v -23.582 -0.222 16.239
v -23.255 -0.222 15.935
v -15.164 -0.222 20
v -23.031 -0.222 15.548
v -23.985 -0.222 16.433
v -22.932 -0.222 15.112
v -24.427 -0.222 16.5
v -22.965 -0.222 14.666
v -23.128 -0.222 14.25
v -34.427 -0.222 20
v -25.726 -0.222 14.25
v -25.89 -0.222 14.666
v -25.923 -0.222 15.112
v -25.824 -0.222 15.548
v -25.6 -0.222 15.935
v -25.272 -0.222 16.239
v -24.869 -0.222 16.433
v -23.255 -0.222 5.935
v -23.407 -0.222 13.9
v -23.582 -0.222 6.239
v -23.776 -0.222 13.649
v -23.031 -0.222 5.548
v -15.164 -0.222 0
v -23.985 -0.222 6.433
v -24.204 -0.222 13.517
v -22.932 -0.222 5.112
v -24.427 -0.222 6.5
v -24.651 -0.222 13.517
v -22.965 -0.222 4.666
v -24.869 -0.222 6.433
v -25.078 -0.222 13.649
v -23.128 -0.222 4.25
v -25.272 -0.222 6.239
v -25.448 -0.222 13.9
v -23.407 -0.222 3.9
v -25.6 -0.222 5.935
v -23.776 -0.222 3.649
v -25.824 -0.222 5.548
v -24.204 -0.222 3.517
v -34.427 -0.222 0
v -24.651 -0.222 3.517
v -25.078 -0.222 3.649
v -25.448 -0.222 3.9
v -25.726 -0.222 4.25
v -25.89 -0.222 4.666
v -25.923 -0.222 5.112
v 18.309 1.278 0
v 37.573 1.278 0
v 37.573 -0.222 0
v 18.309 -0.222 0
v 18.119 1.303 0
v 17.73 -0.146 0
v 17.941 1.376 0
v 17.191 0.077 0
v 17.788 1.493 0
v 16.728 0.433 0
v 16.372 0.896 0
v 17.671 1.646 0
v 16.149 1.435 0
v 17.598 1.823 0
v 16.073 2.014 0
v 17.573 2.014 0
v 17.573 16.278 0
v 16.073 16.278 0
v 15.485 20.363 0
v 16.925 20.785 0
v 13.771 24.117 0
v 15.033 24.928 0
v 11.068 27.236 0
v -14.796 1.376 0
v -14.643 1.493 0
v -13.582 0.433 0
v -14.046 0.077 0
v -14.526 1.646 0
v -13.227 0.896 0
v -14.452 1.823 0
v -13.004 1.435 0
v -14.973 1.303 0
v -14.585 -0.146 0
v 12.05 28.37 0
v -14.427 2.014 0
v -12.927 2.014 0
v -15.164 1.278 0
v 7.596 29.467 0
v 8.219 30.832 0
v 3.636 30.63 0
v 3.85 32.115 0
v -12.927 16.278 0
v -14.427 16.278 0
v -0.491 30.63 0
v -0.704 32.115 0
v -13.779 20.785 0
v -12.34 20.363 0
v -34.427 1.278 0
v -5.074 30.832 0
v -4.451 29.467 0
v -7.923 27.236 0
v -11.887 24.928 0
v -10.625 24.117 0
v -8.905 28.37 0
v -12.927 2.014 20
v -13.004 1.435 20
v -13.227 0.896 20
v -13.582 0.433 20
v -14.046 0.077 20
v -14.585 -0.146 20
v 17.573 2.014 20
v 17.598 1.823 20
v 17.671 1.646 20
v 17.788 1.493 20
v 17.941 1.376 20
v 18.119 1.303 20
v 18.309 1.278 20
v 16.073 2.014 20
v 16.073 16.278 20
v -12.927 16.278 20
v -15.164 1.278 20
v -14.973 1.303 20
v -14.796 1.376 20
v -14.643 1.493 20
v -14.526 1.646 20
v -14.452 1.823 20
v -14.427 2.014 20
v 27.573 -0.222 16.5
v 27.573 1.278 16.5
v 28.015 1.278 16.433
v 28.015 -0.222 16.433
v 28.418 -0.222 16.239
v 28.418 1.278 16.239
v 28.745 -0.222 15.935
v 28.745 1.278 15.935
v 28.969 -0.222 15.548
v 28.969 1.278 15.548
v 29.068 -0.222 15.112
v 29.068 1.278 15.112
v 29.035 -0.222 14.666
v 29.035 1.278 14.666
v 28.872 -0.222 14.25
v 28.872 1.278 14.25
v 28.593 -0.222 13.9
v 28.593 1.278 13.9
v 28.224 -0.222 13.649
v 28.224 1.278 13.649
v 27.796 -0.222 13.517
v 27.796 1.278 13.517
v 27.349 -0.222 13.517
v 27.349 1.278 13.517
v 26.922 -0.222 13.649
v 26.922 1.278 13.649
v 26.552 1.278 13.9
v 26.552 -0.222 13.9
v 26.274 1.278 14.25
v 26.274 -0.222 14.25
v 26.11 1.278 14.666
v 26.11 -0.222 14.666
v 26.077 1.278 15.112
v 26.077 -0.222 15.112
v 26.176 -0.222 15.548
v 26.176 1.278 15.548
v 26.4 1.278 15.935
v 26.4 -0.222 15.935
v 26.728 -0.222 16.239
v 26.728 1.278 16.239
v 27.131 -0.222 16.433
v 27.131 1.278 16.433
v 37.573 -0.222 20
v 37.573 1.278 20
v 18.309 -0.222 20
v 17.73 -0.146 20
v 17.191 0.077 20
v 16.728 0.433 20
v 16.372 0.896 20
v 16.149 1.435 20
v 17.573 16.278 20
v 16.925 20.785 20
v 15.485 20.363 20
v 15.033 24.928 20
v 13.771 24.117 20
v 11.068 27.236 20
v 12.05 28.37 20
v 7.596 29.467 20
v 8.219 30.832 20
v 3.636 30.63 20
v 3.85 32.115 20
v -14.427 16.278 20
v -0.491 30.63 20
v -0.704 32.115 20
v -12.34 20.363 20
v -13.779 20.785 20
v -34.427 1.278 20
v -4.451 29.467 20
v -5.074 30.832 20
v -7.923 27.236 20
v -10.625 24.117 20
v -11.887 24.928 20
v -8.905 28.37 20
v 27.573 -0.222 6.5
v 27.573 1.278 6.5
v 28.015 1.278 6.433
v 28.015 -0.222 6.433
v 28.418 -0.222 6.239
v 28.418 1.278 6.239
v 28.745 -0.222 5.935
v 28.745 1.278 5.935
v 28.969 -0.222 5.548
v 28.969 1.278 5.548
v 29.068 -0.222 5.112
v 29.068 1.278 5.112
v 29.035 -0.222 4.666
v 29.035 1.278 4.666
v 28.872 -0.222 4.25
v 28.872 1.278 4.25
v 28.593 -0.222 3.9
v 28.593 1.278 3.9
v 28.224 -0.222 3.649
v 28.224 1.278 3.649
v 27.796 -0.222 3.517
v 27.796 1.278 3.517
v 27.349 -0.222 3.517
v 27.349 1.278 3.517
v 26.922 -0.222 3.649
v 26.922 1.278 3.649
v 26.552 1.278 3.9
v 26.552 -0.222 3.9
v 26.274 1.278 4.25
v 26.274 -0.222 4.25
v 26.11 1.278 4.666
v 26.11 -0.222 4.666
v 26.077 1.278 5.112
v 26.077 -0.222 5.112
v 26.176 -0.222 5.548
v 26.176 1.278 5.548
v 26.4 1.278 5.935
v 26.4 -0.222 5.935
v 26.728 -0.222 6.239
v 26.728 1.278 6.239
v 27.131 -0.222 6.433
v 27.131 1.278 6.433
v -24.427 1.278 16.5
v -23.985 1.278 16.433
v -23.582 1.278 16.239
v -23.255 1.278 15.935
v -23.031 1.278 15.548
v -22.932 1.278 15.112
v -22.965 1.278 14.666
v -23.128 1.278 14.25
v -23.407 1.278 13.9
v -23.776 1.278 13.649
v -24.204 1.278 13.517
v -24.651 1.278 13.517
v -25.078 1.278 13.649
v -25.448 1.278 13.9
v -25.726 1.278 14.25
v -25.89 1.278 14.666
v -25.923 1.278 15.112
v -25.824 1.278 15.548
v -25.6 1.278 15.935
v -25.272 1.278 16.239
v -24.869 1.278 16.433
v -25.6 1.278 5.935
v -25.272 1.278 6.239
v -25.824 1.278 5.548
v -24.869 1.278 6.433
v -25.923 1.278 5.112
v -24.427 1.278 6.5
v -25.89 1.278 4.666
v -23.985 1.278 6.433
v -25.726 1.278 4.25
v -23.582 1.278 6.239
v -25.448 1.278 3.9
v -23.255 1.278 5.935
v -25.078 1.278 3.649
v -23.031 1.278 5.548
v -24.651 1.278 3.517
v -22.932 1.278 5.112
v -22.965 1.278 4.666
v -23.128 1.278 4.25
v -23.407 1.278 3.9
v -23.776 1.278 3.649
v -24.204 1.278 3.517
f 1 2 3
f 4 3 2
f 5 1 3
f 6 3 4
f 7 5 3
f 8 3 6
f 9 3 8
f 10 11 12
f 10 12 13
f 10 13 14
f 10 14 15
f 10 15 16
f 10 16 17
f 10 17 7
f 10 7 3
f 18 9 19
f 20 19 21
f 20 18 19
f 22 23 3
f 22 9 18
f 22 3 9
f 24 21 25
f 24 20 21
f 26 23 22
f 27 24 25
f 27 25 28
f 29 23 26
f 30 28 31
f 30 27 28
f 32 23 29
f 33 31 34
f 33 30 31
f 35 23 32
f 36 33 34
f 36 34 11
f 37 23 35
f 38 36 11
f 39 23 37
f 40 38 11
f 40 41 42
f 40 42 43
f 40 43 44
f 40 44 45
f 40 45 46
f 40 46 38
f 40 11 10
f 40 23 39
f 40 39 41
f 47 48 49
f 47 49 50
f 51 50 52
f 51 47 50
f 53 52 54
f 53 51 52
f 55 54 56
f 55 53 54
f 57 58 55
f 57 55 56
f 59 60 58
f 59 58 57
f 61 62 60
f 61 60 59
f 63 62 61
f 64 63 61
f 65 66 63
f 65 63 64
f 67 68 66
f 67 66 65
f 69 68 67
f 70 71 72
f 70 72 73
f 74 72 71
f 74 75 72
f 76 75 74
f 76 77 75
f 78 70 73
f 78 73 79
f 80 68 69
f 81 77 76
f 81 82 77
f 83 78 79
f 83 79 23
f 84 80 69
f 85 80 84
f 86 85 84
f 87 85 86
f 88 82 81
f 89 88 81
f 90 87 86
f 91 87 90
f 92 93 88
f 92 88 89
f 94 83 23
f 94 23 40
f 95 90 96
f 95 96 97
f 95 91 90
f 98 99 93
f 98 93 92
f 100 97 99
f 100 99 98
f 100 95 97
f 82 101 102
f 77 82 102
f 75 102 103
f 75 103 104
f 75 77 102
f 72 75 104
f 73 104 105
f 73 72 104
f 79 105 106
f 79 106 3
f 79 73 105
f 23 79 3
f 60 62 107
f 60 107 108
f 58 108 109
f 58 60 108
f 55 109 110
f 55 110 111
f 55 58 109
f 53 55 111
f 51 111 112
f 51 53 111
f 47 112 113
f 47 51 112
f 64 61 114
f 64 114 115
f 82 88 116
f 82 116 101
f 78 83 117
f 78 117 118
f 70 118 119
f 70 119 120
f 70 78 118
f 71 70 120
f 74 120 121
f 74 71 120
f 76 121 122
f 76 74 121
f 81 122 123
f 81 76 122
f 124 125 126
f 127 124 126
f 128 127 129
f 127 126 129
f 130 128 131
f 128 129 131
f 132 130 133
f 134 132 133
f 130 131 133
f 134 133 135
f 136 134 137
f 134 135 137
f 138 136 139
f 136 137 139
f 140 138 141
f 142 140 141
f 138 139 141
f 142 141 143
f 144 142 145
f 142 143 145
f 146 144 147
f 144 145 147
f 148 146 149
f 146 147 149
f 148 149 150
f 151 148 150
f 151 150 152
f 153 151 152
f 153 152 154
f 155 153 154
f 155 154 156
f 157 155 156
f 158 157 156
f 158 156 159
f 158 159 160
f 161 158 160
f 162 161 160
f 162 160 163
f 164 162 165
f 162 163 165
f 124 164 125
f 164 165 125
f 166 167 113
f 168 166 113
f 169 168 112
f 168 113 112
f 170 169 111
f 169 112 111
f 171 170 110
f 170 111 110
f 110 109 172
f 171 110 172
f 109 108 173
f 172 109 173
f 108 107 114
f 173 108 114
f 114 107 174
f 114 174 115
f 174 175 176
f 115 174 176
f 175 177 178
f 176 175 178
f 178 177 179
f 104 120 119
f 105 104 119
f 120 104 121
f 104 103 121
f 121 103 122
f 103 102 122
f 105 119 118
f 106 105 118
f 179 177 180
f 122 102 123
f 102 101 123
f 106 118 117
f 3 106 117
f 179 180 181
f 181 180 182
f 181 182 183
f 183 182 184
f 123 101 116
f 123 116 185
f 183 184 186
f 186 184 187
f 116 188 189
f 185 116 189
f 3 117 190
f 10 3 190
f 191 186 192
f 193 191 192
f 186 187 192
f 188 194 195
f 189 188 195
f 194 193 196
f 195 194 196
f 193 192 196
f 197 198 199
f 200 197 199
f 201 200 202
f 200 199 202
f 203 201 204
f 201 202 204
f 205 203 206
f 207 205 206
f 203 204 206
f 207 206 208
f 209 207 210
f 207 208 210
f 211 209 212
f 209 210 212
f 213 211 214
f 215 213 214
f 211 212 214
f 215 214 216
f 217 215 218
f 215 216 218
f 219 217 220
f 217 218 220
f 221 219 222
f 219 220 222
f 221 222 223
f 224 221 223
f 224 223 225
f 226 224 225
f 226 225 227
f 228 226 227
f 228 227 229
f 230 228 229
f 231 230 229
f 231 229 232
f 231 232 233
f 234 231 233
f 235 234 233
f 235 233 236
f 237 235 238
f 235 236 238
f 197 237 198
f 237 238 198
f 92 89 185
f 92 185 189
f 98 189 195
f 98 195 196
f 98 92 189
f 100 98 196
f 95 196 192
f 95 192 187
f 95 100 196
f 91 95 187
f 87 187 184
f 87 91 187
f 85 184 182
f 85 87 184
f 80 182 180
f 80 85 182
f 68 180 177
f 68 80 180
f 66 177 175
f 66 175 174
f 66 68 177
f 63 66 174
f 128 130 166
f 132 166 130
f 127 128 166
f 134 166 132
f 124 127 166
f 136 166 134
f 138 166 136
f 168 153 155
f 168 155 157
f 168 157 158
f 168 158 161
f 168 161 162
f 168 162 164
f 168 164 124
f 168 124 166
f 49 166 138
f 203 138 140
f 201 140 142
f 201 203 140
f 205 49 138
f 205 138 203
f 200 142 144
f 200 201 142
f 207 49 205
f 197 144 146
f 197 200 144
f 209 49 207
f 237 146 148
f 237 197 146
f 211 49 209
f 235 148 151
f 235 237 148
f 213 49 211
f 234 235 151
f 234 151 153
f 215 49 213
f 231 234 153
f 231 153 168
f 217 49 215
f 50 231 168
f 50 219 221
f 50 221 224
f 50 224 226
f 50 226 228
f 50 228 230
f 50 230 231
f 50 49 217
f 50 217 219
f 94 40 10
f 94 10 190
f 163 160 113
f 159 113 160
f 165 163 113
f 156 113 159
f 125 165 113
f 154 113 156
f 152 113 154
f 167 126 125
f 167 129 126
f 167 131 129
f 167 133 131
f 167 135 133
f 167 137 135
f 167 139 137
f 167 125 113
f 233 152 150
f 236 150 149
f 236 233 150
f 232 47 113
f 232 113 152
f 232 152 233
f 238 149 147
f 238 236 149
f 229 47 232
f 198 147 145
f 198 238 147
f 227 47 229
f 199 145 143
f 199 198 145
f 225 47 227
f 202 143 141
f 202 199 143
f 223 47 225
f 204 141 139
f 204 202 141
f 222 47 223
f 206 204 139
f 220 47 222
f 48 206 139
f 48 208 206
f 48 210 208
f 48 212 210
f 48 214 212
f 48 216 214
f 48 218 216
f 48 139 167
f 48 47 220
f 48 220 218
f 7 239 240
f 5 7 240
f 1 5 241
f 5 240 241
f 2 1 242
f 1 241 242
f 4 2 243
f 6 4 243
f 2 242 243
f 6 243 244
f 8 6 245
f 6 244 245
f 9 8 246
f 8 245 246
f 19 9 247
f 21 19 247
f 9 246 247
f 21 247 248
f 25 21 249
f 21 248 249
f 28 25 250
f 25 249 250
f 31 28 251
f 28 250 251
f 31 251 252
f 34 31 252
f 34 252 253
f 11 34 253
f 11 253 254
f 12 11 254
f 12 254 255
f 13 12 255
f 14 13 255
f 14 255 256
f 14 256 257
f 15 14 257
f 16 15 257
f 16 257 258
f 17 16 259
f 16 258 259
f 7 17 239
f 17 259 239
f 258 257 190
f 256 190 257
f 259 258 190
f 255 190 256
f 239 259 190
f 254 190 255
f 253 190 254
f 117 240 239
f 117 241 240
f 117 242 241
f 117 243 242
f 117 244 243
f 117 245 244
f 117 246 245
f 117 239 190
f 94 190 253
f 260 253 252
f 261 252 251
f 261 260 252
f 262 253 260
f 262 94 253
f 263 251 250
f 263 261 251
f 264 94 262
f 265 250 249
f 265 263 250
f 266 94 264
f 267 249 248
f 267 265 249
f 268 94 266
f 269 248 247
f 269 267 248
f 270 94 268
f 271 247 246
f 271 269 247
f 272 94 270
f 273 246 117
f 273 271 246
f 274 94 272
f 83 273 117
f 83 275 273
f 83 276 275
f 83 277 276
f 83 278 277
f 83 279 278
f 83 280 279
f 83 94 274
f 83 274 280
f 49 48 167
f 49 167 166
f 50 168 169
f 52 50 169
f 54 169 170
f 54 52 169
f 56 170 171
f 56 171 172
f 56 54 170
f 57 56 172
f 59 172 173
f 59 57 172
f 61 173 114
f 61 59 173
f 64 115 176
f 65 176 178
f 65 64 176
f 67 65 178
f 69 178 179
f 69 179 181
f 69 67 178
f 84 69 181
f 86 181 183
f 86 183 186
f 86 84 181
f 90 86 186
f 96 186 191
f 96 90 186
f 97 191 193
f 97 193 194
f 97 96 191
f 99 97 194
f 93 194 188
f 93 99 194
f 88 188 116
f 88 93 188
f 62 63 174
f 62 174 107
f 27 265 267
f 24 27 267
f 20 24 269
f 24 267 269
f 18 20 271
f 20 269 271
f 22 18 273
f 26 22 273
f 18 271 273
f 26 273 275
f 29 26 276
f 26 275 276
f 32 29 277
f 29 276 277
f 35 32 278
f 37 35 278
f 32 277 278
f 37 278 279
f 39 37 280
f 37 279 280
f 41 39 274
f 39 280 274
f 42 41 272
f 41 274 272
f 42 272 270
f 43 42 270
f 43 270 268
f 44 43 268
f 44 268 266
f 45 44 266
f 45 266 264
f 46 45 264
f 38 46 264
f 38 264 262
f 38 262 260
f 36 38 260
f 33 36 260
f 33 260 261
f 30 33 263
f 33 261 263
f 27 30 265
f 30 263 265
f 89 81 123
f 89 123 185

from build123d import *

# Parameters (mm, degrees)
BASE_FLANGE1_DEPTH = 20
SKETCH2_R          = 1.5
CUT_EXTRUDE1_DEPTH = 1.5
SKETCH4_R          = 1.5
CUT_EXTRUDE2_DEPTH = 1.5


# Sheet-metal steps are written as plain solids
with BuildPart() as part:
    # Sketch1 → Base-Flange1 (new body)
    with BuildSketch(Plane.XY):
        with BuildLine():
            Line((-34.427312775, 1.27753304), (-15.163912775, 1.27753304))
            ThreePointArc((-15.163912775, 1.27753304), (-14.64305792, 1.493278185), (-14.427312775, 2.01413304))
            Line((-14.427312775, 2.01413304), (-14.427312775, 16.27753304))
            ThreePointArc((-14.427312775, 16.27753304), (1.572687225, 32.27753304), (17.572687225, 16.27753304))
            Line((17.572687225, 16.27753304), (17.572687225, 2.01413304))
            ThreePointArc((17.572687225, 2.01413304), (17.78843237, 1.493278185), (18.309287225, 1.27753304))
            Line((18.309287225, 1.27753304), (37.572687225, 1.27753304))
            Line((37.572687225, 1.27753304), (37.572687225, -0.22246696))
            Line((37.572687225, -0.22246696), (18.309287225, -0.22246696))
            ThreePointArc((18.309287225, -0.22246696), (16.727772198, 0.432618013), (16.072687225, 2.01413304))
            Line((16.072687225, 2.01413304), (16.072687225, 16.27753304))
            ThreePointArc((16.072687225, 16.27753304), (1.572687225, 30.77753304), (-12.927312775, 16.27753304))
            Line((-12.927312775, 16.27753304), (-12.927312775, 2.01413304))
            ThreePointArc((-12.927312775, 2.01413304), (-13.582397749, 0.432618013), (-15.163912775, -0.22246696))
            Line((-15.163912775, -0.22246696), (-34.427312775, -0.22246696))
            Line((-34.427312775, -0.22246696), (-34.427312775, 1.27753304))
        make_face()
    extrude(amount=BASE_FLANGE1_DEPTH)

    # Sketch2 → Cut-Extrude1 (cut)
    with BuildSketch(Plane(origin=(0, 1.27753304, 0), x_dir=(1, 0, 0), z_dir=(0, 1, 0))):
        with Locations(Location((-24.427312775, -5, 0), (0, 0, 270))):
            Circle(SKETCH2_R)
        with Locations(Location((-24.427312775, -15, 0), (0, 0, 270))):
            Circle(SKETCH2_R)
    extrude(amount=-CUT_EXTRUDE1_DEPTH, mode=Mode.SUBTRACT)

    # Sketch4 → Cut-Extrude2 (cut)
    with BuildSketch(Plane(origin=(0, 1.27753304, 0), x_dir=(1, 0, 0), z_dir=(0, 1, 0))):
        with Locations(Location((27.572687225, -5, 0), (0, 0, 270))):
            Circle(SKETCH4_R)
        with Locations(Location((27.572687225, -15, 0), (0, 0, 270))):
            Circle(SKETCH4_R)
    extrude(amount=-CUT_EXTRUDE2_DEPTH, mode=Mode.SUBTRACT)


solid = part.part
